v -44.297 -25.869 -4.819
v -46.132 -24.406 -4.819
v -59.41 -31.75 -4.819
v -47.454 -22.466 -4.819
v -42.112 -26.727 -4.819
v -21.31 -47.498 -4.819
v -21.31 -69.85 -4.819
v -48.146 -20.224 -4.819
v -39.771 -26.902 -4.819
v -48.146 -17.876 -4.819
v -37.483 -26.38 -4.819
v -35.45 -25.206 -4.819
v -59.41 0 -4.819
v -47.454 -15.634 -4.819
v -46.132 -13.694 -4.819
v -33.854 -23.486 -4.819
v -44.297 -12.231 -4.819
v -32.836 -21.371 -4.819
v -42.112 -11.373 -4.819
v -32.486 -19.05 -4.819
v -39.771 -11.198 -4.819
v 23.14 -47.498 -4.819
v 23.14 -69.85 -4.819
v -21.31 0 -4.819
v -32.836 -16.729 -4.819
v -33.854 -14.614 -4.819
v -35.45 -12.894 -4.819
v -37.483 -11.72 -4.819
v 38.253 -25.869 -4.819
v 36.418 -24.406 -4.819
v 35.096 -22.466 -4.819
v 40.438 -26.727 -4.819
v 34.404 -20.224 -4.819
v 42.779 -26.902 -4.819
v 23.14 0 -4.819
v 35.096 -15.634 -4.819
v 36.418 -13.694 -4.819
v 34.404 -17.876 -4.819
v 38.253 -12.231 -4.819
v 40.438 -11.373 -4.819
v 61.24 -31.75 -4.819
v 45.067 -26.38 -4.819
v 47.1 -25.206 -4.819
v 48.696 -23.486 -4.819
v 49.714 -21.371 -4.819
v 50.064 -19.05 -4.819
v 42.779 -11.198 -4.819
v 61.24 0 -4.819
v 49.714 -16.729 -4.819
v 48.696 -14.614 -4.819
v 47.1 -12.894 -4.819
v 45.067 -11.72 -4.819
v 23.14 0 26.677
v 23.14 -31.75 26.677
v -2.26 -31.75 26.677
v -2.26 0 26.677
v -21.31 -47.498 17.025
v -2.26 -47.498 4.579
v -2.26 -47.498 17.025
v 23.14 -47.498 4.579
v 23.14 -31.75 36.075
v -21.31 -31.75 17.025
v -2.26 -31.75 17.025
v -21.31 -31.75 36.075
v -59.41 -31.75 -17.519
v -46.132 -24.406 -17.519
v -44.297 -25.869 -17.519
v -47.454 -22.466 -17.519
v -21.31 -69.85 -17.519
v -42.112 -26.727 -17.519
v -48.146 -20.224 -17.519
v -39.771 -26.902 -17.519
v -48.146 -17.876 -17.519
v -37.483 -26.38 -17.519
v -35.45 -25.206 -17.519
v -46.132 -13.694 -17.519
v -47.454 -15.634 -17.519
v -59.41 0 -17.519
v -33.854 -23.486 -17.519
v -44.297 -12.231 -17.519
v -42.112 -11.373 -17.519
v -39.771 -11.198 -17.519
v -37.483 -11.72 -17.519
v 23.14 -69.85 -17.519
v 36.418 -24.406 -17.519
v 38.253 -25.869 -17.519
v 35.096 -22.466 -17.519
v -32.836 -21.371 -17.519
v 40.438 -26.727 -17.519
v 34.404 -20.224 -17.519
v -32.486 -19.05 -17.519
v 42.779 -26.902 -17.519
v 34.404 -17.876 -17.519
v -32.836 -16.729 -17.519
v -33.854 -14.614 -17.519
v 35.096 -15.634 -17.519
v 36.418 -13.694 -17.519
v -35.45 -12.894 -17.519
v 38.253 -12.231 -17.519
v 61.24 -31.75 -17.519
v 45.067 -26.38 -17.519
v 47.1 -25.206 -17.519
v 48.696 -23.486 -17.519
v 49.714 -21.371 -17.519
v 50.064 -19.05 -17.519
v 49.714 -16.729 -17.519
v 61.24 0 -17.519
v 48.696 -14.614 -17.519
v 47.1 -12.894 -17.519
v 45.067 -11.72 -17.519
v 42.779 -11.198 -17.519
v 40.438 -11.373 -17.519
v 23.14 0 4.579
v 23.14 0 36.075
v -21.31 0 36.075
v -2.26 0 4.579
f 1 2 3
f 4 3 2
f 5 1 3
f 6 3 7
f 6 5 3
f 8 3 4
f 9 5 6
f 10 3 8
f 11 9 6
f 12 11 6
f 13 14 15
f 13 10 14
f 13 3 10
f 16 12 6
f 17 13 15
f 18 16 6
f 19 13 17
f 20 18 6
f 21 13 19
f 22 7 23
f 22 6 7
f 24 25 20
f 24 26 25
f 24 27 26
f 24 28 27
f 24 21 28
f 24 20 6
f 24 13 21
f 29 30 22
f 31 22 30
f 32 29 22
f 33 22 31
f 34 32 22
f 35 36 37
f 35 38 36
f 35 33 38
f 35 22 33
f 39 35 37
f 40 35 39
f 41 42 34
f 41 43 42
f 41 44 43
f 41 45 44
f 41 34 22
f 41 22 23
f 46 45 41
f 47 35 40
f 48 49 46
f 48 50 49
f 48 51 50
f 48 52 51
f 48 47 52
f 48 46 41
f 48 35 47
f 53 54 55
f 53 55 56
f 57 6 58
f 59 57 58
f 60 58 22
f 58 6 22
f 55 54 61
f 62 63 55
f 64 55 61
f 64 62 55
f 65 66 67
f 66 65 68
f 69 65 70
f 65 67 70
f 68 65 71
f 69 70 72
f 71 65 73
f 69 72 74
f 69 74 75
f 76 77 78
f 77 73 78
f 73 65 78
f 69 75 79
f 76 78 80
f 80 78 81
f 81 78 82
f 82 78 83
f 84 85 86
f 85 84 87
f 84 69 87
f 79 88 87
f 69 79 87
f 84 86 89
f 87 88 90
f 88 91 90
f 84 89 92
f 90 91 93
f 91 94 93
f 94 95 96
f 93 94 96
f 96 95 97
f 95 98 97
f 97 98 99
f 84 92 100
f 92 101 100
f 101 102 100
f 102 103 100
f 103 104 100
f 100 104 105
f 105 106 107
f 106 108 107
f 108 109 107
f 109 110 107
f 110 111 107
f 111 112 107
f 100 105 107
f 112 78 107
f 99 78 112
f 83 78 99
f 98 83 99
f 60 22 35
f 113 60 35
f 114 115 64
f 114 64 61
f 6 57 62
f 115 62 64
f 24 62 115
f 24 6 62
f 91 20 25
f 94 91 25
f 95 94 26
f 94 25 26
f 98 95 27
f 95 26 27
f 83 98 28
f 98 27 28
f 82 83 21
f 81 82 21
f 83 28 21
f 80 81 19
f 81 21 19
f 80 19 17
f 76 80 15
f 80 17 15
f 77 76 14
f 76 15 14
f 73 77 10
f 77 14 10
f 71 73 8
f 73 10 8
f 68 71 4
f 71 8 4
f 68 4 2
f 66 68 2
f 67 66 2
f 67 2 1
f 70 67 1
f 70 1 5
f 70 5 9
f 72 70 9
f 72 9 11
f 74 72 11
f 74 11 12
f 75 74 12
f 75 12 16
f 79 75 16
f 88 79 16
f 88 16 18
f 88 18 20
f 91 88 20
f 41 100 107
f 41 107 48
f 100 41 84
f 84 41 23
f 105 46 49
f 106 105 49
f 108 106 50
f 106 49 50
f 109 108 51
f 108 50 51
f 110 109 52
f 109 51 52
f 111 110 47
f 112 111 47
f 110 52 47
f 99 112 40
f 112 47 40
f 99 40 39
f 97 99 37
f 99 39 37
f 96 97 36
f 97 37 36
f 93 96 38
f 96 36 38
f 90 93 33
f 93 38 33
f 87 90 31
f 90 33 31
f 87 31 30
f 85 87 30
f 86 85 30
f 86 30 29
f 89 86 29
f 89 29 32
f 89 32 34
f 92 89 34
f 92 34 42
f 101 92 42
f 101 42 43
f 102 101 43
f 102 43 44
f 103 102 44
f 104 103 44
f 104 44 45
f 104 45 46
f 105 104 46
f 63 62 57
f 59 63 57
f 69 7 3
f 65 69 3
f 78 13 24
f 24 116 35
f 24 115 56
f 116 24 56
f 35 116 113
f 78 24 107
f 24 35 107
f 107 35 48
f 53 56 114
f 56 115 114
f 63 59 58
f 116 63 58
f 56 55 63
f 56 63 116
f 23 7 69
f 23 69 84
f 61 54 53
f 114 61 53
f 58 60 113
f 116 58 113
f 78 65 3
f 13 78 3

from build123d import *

# Parameters (mm, degrees)
F0_W      = 120.65
F0_H      = 12.7
F1_DEPTH  = 69.85
F2_R      = 7.874
F3_DEPTH  = 15.748
F5_DEPTH  = 12.7
F4_W      = 44.45
F4_H      = 47.498
F6_DEPTH  = 40.894
F7_W      = 47.498
F7_H      = 22.098
F8_DEPTH  = 25.4
F9_W      = 15.748
F9_H      = 19.05
F10_DEPTH = 44.45


with BuildPart() as f1:
    # F0 (on Front) → F1 (new body)
    with BuildSketch(Plane.XZ):
        with Locations((0.915147, -11.16853)):
            Rectangle(F0_W, F0_H)
    extrude(amount=F1_DEPTH)

    # F2 (on face) → F3 (cut)
    with BuildSketch(Plane.XY.offset(-4.81853)):
        with Locations((42.190147, -19.05)):
            Circle(F2_R)
        with Locations((-40.359853, -19.05)):
            Circle(F2_R)
    extrude(amount=-F3_DEPTH, mode=Mode.SUBTRACT)

    # F2 (on face) → F5 (cut)
    with BuildSketch(Plane.XY.offset(-4.81853)):
        Polygon((-59.409853, -69.85), (-21.309853, -69.85), (-59.409853, -31.75), align=None)
        Polygon((61.240147, -69.85), (61.240147, -31.75), (23.140147, -69.85), align=None)
    extrude(amount=-F5_DEPTH, mode=Mode.SUBTRACT)

    # F4 (on face) → F6 (join)
    with BuildSketch(Plane.XY.offset(-4.81853)):
        with Locations((0.915147, -23.749)):
            Rectangle(F4_W, F4_H)
    extrude(amount=F6_DEPTH)

    # F7 (on face) → F8 (cut)
    with BuildSketch(Plane.YZ.offset(23.140147)):
        with Locations((-23.749, 15.62847)):
            Rectangle(F7_W, F7_H)
    extrude(amount=-F8_DEPTH, mode=Mode.SUBTRACT)

    # F9 (on face) → F10 (cut)
    with BuildSketch(Plane(origin=(-21.309853, 0, 0), x_dir=(0, -1, 0), z_dir=(-1, 0, 0))):
        with Locations((39.624, 26.55047)):
            Rectangle(F9_W, F9_H)
    extrude(amount=-F10_DEPTH, mode=Mode.SUBTRACT)


solid = f1.part
